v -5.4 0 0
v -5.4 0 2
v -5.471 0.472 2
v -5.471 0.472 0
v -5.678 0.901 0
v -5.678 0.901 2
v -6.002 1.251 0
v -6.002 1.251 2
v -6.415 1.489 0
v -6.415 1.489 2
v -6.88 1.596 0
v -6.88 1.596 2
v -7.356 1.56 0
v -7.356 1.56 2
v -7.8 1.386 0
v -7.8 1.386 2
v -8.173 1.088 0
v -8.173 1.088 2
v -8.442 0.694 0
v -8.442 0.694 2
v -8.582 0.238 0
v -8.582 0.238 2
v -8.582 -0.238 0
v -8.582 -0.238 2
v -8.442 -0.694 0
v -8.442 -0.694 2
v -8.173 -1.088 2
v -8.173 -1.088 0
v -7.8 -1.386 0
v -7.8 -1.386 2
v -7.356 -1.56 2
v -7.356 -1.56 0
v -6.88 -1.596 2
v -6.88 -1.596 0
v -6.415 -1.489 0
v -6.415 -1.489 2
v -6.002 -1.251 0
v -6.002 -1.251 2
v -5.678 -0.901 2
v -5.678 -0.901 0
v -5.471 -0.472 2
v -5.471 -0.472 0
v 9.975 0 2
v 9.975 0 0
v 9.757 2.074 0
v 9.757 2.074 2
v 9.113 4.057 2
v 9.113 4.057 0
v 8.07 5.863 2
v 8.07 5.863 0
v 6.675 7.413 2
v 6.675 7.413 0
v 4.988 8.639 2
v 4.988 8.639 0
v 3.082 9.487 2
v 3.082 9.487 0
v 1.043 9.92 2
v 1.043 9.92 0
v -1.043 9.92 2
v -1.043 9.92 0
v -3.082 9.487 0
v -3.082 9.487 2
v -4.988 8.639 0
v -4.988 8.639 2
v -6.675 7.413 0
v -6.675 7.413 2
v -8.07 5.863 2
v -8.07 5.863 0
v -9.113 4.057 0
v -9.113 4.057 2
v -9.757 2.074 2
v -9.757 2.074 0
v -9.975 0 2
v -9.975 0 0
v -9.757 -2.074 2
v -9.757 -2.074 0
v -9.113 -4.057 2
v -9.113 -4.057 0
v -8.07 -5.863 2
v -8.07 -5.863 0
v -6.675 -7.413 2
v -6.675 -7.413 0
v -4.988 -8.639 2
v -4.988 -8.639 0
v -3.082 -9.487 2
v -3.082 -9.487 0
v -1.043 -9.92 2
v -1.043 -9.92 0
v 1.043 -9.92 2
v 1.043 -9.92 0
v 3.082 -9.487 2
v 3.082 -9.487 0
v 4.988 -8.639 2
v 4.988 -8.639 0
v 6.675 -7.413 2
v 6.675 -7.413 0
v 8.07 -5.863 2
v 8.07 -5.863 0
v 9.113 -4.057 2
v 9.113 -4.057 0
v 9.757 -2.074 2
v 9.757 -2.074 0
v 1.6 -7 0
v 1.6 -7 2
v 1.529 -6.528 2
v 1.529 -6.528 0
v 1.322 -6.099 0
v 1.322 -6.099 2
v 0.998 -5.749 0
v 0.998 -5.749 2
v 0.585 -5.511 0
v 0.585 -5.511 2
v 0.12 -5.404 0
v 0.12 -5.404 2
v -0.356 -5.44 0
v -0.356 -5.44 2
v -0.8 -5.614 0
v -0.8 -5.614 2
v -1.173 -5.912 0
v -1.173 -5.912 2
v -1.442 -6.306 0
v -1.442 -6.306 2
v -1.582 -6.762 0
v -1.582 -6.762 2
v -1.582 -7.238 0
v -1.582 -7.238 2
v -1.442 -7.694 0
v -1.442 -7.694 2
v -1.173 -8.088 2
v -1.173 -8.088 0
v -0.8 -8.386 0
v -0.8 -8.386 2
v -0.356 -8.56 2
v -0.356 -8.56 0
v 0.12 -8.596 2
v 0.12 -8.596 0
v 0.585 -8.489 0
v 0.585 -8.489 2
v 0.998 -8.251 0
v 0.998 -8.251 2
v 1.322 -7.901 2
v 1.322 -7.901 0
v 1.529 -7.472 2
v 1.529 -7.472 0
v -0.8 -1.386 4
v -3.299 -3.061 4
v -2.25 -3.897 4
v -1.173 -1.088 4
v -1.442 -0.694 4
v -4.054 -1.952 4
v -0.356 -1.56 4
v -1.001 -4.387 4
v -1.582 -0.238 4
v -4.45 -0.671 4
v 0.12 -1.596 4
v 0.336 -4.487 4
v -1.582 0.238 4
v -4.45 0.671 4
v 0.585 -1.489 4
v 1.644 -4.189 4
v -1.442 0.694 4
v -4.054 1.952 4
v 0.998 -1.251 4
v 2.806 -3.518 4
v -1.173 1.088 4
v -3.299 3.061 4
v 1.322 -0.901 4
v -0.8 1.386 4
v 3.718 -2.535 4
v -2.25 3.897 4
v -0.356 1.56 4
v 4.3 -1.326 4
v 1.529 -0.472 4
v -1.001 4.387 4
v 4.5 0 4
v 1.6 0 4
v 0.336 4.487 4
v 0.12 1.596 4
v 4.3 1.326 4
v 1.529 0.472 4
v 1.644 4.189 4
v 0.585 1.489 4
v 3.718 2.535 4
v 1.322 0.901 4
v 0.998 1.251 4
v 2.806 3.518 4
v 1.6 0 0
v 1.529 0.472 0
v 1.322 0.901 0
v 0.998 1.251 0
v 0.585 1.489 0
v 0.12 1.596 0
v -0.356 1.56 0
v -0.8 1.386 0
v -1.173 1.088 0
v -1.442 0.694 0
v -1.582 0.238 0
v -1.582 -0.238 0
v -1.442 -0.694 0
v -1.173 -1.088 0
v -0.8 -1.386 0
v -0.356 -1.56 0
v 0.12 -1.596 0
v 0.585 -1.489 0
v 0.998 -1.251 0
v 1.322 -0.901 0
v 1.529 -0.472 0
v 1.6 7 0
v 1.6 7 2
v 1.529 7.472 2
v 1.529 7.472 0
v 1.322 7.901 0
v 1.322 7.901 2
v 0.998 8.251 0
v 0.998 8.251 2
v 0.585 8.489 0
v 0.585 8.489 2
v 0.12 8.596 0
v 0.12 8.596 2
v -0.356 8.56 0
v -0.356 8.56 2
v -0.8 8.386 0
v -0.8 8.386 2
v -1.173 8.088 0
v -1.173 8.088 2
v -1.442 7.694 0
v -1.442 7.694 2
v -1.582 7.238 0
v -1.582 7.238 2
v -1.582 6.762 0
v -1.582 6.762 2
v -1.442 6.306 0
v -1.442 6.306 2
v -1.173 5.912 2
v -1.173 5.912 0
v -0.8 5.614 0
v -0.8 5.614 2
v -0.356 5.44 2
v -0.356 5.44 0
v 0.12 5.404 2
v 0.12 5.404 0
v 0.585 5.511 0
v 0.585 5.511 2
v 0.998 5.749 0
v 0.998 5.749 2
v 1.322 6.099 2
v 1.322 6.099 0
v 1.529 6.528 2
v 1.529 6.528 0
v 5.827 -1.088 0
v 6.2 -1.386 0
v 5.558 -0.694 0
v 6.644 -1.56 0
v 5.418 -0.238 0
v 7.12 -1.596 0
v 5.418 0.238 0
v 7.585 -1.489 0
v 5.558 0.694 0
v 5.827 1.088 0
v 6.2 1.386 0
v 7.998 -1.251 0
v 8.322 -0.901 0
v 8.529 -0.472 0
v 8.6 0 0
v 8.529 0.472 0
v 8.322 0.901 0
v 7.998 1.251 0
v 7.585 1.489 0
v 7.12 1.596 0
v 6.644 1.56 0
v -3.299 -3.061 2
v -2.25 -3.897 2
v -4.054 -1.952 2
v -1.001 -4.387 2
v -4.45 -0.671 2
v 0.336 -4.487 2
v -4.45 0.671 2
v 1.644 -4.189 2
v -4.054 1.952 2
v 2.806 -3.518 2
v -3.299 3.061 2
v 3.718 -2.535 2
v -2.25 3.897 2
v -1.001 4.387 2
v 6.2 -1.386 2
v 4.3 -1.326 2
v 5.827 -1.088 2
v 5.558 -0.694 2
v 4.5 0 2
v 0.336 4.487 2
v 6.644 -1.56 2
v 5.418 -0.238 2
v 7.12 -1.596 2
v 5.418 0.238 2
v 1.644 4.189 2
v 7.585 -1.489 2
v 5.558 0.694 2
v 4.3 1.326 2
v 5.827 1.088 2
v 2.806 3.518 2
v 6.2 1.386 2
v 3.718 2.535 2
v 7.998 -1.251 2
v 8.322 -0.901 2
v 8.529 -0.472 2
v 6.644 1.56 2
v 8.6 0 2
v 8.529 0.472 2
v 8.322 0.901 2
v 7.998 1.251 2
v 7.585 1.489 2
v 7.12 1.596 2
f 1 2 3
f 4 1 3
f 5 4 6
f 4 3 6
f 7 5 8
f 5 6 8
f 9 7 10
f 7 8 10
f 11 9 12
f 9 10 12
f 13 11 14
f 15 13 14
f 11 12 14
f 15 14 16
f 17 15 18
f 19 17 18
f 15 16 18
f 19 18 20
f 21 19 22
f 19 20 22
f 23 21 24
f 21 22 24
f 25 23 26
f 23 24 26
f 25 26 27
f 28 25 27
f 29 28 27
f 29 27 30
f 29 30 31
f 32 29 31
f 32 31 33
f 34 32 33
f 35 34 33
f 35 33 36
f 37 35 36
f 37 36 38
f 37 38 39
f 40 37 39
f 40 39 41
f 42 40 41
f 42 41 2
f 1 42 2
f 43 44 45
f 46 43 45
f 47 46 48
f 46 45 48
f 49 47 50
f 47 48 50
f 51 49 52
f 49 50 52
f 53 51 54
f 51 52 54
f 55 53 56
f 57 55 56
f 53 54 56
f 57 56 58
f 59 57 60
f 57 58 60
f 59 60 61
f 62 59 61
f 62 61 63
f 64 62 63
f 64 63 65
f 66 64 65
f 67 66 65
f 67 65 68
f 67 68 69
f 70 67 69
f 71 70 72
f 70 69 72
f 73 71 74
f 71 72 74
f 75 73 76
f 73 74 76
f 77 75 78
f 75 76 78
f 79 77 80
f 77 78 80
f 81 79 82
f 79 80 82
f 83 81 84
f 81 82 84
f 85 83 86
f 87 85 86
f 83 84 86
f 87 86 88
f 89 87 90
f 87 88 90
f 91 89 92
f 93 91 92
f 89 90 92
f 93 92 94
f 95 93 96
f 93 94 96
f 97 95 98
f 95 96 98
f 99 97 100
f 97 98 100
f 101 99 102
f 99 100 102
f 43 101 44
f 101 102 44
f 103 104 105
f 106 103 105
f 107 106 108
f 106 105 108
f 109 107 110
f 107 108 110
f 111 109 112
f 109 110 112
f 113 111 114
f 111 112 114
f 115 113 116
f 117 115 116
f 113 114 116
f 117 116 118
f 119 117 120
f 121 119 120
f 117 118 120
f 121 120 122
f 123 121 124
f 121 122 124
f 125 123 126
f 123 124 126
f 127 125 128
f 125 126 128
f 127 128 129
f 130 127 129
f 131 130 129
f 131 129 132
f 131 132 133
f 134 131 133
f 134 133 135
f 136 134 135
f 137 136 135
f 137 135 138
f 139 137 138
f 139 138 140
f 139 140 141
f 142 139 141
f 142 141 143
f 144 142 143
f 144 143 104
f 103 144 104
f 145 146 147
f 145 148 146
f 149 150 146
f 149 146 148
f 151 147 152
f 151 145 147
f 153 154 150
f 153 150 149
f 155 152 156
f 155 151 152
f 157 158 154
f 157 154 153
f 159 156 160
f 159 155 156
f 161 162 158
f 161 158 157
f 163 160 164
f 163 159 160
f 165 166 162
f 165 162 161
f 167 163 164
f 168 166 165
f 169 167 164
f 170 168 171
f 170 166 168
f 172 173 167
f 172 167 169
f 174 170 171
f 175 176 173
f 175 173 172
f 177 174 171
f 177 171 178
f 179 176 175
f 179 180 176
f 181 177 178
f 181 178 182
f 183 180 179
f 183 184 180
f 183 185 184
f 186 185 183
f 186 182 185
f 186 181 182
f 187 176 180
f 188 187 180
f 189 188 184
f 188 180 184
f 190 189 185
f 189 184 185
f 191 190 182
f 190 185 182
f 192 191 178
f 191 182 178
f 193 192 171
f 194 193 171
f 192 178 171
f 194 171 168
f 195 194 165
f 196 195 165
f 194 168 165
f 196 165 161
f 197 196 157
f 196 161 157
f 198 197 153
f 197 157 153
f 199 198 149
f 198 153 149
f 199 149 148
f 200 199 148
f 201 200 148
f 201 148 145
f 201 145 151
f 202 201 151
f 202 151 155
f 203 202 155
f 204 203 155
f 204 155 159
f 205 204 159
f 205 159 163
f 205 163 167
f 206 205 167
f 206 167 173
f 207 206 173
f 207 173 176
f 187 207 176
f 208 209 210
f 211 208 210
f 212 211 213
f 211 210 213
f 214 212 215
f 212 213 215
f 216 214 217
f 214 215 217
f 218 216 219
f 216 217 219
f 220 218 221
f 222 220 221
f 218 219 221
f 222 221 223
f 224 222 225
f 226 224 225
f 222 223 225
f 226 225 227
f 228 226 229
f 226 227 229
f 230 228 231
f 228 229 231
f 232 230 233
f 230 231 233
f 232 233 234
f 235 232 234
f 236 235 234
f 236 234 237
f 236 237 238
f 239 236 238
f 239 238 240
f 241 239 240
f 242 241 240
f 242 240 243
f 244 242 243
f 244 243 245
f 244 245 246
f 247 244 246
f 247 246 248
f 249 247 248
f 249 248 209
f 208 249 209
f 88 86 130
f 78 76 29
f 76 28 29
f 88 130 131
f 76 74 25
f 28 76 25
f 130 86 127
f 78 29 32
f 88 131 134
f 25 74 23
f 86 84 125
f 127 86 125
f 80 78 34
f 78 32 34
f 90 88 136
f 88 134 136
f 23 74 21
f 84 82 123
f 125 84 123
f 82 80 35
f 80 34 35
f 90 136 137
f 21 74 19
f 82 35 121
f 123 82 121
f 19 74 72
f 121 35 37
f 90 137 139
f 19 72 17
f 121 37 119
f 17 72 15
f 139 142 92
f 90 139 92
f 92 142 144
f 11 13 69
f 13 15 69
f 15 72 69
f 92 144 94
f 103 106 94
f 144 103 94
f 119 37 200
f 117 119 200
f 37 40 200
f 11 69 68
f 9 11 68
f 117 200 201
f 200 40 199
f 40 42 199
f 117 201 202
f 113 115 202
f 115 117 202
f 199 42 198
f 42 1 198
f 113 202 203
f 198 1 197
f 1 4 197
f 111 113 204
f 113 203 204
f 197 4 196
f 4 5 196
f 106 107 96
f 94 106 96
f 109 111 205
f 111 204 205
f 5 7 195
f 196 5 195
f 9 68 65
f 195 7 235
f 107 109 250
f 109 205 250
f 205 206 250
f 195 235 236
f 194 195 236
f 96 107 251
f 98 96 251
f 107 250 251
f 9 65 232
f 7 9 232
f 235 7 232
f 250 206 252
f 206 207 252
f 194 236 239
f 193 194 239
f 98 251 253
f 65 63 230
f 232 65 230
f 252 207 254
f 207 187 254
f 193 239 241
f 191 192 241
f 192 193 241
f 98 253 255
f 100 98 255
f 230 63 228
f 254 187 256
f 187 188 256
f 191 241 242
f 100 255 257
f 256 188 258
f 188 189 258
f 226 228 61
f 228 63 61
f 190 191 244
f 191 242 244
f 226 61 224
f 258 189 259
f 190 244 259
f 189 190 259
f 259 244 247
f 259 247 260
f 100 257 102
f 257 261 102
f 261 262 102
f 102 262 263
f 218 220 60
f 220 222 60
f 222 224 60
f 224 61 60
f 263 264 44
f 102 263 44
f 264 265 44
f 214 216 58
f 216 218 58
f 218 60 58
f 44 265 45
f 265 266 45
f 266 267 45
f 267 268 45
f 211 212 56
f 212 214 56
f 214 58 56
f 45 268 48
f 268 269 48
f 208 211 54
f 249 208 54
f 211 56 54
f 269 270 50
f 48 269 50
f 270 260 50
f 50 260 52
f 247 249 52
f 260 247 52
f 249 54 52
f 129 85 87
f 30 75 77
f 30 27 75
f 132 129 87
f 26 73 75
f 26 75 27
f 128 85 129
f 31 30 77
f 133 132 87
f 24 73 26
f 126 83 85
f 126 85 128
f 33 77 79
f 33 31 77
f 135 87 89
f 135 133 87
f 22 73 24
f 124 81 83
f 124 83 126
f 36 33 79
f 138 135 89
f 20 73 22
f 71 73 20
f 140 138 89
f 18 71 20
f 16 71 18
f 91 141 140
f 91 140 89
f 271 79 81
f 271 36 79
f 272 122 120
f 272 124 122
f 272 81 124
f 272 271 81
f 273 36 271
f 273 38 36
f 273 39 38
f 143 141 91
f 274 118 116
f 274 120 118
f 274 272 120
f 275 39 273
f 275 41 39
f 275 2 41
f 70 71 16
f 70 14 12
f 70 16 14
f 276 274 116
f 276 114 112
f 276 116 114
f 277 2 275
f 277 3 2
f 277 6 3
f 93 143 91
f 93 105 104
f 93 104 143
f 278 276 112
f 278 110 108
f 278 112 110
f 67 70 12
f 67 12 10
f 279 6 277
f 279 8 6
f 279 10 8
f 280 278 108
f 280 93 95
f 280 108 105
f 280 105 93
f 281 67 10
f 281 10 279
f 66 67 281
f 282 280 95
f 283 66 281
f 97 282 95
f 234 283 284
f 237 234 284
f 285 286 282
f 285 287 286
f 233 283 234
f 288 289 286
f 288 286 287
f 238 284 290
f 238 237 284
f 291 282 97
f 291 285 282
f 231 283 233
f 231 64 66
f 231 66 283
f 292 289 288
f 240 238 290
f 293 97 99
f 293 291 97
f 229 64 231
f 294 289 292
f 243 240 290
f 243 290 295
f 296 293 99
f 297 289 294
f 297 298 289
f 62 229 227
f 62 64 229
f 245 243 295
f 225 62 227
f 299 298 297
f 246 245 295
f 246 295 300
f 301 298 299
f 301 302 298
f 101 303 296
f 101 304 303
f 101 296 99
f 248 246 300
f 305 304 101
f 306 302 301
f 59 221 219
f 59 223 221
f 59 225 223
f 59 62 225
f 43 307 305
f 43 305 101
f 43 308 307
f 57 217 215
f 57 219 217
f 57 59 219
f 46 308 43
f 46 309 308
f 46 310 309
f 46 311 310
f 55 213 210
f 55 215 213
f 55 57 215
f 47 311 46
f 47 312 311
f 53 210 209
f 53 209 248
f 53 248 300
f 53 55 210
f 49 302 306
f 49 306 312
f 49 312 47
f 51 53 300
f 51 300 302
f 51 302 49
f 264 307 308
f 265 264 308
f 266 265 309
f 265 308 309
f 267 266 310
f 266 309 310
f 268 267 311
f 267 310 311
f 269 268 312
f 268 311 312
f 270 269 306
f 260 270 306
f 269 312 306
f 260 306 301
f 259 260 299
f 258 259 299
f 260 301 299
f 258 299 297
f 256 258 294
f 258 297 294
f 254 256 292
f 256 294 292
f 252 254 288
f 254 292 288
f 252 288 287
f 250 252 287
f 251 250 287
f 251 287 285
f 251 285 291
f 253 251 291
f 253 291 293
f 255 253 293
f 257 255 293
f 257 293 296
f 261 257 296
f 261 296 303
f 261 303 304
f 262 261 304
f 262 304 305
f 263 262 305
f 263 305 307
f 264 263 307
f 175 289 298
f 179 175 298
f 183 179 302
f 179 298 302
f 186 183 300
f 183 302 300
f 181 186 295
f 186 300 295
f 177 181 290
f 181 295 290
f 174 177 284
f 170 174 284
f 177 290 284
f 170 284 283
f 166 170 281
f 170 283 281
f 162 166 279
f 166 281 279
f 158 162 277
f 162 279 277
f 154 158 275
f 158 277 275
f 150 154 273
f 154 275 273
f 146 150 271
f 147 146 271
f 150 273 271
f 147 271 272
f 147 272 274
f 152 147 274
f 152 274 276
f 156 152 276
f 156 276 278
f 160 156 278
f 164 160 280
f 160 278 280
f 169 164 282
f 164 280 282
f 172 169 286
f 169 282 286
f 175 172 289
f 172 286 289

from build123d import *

# Parameters (mm, degrees)
SKETCH_1_R          = 9.975
EXTRUDE_1_DEPTH     = 2
SKETCH_2_R          = 4.5
EXTRUDE_2_DEPTH     = 2
SKETCH_3_R          = 1.6
CUT_EXTRUDE_1_DEPTH = 15.662920923
SKETCH_4_R          = 1.6
CUT_EXTRUDE_2_DEPTH = 15.247850715


with BuildPart() as part:
    # ｽｹｯﾁ1 → ﾎﾞｽ - 押し出し1 (new body)
    with BuildSketch(Plane.XY):
        Circle(SKETCH_1_R)
    extrude(amount=EXTRUDE_1_DEPTH)

    # ｽｹｯﾁ2 → ﾎﾞｽ - 押し出し2 (add)
    with BuildSketch(Plane.XY.offset(2)):
        Circle(SKETCH_2_R)
    extrude(amount=EXTRUDE_2_DEPTH)

    # ｽｹｯﾁ3 → ｶｯﾄ - 押し出し1 (cut, through all)
    with BuildSketch(Plane.XY.offset(4)):
        Circle(SKETCH_3_R)
    extrude(amount=-CUT_EXTRUDE_1_DEPTH, mode=Mode.SUBTRACT)

    # ｽｹｯﾁ4 → ｶｯﾄ - 押し出し2 (cut, through all)
    with BuildSketch(Plane.XY.offset(2)):
        with Locations((0, 7)):
            Circle(SKETCH_4_R)
        with Locations((0, -7)):
            Circle(SKETCH_4_R)
        with Locations((-7, 0)):
            Circle(SKETCH_4_R)
        with Locations((7, 0)):
            Circle(SKETCH_4_R)
    extrude(amount=-CUT_EXTRUDE_2_DEPTH, mode=Mode.SUBTRACT)


solid = part.part
